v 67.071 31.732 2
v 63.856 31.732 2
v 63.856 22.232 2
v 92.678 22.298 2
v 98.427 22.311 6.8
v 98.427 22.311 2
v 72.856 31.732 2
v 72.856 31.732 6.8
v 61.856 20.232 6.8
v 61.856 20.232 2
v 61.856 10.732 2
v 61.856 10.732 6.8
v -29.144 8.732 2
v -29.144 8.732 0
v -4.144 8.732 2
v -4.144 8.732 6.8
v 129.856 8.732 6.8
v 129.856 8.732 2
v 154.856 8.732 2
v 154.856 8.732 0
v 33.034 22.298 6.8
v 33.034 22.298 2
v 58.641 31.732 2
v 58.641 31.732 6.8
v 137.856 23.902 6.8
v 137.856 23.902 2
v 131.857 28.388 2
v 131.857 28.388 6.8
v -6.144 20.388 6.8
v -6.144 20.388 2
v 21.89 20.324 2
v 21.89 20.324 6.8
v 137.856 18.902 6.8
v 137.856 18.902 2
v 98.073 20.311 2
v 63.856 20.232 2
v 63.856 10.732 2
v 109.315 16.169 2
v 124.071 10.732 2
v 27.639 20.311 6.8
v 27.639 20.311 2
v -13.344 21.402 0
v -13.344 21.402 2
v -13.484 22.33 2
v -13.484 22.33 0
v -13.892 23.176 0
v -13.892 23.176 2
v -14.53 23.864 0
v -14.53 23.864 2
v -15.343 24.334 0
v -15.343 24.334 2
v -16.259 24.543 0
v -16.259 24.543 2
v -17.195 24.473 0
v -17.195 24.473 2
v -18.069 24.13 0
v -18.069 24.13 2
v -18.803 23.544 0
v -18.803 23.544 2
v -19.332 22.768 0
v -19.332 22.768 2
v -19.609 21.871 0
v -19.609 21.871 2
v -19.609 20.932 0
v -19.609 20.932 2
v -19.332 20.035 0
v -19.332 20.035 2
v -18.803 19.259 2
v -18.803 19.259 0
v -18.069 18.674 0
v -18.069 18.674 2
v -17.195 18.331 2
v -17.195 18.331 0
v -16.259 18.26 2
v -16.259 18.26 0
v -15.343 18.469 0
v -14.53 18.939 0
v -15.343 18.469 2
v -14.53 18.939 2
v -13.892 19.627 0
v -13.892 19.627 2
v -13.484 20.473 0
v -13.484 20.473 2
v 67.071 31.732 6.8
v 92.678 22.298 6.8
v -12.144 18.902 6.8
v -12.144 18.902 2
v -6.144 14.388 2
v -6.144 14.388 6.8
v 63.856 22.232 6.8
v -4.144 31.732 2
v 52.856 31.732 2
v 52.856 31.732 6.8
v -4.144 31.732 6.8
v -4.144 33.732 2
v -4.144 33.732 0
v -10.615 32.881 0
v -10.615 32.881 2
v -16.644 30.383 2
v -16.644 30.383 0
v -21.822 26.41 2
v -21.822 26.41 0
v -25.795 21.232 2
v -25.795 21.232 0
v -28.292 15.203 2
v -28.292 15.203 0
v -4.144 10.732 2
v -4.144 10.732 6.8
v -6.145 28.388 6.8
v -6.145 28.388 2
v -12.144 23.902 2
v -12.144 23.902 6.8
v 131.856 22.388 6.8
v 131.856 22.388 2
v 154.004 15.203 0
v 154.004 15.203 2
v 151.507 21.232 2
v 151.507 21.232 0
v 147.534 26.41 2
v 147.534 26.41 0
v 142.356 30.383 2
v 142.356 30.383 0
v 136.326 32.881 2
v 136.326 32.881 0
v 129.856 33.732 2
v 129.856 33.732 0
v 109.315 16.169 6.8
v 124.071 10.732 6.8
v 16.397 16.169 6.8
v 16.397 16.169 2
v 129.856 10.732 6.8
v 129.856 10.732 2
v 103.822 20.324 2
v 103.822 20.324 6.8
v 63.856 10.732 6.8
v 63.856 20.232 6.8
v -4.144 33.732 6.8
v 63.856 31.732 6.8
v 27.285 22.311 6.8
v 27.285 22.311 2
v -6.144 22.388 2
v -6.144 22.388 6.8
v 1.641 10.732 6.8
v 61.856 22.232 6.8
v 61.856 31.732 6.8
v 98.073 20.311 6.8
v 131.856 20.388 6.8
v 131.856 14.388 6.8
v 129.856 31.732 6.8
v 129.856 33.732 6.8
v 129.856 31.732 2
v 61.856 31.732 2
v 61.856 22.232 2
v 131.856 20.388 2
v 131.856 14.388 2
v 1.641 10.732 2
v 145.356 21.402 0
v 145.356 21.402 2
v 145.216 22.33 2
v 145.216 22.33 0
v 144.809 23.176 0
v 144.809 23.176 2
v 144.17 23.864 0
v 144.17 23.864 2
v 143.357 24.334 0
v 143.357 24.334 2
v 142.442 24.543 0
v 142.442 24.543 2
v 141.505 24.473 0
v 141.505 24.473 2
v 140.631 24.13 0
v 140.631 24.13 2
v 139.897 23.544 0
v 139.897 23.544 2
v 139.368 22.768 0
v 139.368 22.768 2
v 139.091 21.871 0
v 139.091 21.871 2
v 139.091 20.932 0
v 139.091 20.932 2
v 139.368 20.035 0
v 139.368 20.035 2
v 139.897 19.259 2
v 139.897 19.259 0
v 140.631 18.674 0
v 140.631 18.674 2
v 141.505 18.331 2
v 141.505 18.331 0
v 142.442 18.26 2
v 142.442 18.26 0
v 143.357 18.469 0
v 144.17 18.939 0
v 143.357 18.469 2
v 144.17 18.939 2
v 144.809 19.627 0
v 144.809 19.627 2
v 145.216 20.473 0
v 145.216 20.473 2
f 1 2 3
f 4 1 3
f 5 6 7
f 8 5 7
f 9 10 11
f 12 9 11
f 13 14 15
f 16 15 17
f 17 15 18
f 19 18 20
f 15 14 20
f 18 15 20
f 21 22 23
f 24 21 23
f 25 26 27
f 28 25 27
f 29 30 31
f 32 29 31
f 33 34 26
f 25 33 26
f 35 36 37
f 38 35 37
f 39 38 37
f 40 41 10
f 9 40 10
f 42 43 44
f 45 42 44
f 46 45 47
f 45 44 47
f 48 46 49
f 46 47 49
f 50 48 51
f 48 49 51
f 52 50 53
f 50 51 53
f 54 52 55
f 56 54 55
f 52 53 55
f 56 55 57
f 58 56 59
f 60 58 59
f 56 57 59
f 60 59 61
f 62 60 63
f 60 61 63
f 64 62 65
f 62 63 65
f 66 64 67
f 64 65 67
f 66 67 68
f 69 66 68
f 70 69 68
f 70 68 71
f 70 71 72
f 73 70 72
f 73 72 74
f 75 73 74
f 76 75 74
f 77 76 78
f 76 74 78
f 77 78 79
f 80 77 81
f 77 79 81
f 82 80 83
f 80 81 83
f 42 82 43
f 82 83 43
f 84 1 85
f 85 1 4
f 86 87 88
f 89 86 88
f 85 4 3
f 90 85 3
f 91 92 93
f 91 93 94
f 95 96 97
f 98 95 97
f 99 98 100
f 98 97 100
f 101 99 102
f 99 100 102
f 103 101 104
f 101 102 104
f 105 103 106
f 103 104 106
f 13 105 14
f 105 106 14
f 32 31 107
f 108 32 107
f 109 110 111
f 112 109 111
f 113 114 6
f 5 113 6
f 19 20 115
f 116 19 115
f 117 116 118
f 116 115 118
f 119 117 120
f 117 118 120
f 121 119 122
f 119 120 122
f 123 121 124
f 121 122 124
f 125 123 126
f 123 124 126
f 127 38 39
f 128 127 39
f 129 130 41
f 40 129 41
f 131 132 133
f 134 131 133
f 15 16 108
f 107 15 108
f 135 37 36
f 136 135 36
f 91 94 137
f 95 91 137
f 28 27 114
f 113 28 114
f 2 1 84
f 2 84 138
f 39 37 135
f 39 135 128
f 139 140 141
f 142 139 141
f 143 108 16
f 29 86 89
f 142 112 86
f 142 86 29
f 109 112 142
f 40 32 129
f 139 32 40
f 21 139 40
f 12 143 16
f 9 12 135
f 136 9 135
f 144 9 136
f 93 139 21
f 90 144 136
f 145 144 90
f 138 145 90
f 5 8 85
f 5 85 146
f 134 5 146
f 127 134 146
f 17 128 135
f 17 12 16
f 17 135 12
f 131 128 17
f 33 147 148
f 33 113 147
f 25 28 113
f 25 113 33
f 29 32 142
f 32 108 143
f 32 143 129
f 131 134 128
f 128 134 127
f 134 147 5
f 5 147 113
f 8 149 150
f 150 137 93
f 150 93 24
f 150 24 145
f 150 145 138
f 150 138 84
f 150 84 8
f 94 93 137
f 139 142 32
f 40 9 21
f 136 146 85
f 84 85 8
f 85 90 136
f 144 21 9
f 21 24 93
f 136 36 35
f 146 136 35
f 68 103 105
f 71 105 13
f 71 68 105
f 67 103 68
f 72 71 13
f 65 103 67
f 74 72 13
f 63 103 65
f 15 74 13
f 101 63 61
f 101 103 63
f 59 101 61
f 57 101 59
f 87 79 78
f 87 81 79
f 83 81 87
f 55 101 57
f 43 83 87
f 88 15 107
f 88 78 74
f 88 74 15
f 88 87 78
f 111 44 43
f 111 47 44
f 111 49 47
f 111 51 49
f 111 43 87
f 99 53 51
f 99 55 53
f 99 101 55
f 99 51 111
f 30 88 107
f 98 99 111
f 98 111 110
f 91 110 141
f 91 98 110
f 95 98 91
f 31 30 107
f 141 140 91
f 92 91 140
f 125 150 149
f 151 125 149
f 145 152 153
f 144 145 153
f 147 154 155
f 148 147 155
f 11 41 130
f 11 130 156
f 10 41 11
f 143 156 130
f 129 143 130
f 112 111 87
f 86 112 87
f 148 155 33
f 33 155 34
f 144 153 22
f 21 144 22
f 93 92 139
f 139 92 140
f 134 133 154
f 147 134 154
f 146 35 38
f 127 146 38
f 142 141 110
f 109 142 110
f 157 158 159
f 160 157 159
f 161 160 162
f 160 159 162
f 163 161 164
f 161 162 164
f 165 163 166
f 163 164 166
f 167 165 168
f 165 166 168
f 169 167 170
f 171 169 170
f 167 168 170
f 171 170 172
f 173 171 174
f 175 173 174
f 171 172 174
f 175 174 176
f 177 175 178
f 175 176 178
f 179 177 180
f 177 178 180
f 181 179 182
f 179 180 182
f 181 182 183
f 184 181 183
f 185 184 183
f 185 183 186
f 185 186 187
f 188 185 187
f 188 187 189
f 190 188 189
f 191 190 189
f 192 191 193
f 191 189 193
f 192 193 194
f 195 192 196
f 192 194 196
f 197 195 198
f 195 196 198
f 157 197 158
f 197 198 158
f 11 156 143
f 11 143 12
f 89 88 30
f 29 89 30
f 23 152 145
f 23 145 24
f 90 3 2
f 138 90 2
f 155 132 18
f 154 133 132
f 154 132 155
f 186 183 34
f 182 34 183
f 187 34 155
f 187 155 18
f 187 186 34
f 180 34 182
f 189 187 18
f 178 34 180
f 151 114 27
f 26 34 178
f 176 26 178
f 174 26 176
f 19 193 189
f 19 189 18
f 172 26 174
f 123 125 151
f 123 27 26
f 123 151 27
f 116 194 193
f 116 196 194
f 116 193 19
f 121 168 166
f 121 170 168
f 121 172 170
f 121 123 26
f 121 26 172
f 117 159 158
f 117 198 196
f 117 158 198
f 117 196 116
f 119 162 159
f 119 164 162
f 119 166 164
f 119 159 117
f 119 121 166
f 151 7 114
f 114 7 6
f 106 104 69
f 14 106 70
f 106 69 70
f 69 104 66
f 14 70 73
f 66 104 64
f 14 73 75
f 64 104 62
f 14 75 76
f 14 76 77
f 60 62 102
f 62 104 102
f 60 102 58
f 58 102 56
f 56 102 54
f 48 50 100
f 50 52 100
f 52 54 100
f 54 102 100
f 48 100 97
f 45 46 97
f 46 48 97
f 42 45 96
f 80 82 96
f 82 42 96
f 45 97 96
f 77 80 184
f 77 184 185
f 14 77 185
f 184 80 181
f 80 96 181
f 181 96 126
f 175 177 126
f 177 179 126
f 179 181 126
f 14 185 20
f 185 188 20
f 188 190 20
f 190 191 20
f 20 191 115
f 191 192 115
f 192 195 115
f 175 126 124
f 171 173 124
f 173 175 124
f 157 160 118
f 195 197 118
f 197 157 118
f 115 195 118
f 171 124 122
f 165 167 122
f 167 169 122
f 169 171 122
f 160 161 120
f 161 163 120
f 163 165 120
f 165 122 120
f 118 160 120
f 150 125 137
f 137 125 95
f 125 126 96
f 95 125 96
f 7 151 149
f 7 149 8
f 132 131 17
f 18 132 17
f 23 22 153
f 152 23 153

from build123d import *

# Parameters (mm, degrees)
F1_DEPTH = 6.8
F2_T     = -2
F4_DEPTH = 4.8
F6_DEPTH = 4.8
F5_R     = 3.15
F7_DEPTH = 2


# Not quite as in the source:
# - a feature names something its author has since deleted; it is built from what else it names


with BuildPart() as f1:
    # F0 (on Top) → F1 (new body)
    with BuildSketch(Plane.XY):
        with BuildLine():
            Line((129.8559711718, 33.7323809788), (-4.1440288282, 33.7323809788))
            ThreePointArc((-4.1440288282, 33.7323809788), (-21.8216983579, 26.4100505084), (-29.1440288282, 8.7323809788))
            Line((-29.1440288282, 8.7323809788), (154.8559711718, 8.7323809788))
            ThreePointArc((154.8559711718, 8.7323809788), (147.5336407015, 26.4100505084), (129.8559711718, 33.7323809788))
        make_face()
    extrude(amount=F1_DEPTH)

    # F2
    f2_openings = [f1.faces().sort_by_distance(p)[0] for p in [
        (62.855971, 20.804106, 6.8),
    ]]
    offset(amount=F2_T, openings=f2_openings)

    # F3 (on face) → F4 (cut)
    with BuildSketch(Plane.XY.offset(6.8)):
        with BuildLine():
            Line((-4.1440288282, 8.7323809788), (-4.1440288282, 10.7323809788))
            Line((-4.1440288282, 10.7323809788), (-27.056907303, 10.7323809788))
            ThreePointArc((-27.056907303, 10.7323809788), (-19.6842990961, 25.6882059366), (-4.1440288282, 31.7323809788))
            Line((-4.1440288282, 31.7323809788), (-4.1440288282, 33.7323809788))
            ThreePointArc((-4.1440288282, 33.7323809788), (-21.8216983579, 26.4100505084), (-29.1440288282, 8.7323809788))
            Line((-29.1440288282, 8.7323809788), (-4.1440288282, 8.7323809788))
        make_face()
        with BuildLine():
            Line((152.7688496466, 10.7323809788), (129.8559711718, 10.7323809788))
            Line((129.8559711718, 10.7323809788), (129.8559711718, 8.7323809788))
            Line((129.8559711718, 8.7323809788), (154.8559711718, 8.7323809788))
            ThreePointArc((154.8559711718, 8.7323809788), (147.5336407015, 26.4100505084), (129.8559711718, 33.7323809788))
            Line((129.8559711718, 33.7323809788), (129.8559711718, 31.7323809788))
            ThreePointArc((129.8559711718, 31.7323809788), (145.3962414397, 25.6882059366), (152.7688496466, 10.7323809788))
        make_face()
    extrude(amount=-F4_DEPTH, mode=Mode.SUBTRACT)

    # F5 (on face) → F6 (join)
    with BuildSketch(Plane.XY.offset(2)):
        Polygon((-6.1442747528, 21.3878121691), (-6.144358997, 22.3878121656), (-6.1448644621, 28.3878121443), (-12.1442590792, 23.9015265012), (-12.1442590792, 21.4015265012), (-12.1442590792, 18.9015265012), (-6.1442747528, 14.3878121691), (-6.1442747528, 20.3878121691), align=None)
        Polygon((21.8896443518, 20.3237342556), (27.2847434124, 22.3114023306), (-6.144358997, 22.3878121656), (-6.1442747528, 21.3878121691), (-6.1442747528, 20.3878121691), align=None)
        Polygon((-4.1440288282, 10.7323809788), (1.6412445236, 10.7323809788), (16.3966900356, 16.1685977463), (27.6392464887, 20.3105922291), (21.8896443518, 20.3237342556), align=None)
        Polygon((32.9729093256, 22.2756259058), (33.0343455494, 22.298260304), (27.2847434124, 22.3114023306), (21.8896443518, 20.3237342556), (27.6392464887, 20.3105922291), align=None)
        Polygon((33.0343455494, 22.298260304), (58.6412445236, 31.7323809788), (54.8559711718, 31.7323809788), (52.8559711718, 31.7323809788), (27.2847434124, 22.3114023306), align=None)
        Polygon((61.8564633663, 20.2323809788), (61.8564633663, 22.2323807827), (33.0343455494, 22.298260304), (32.9729093256, 22.2756259058), (27.6392464887, 20.3105922291), align=None)
        Polygon((62.8559711718, 10.7323809788), (62.8559711718, 31.7323809788), (61.8564633663, 31.7323809788), (61.8564633663, 22.2323807827), (61.8564633663, 20.2323809788), (61.8564633663, 10.7323809788), align=None)
        Polygon((92.6775967943, 22.298260304), (63.8559711718, 22.2323819077), (63.8559711718, 20.2323821038), (98.0726958549, 20.3105922291), (92.7390330181, 22.2756259058), align=None)
        Polygon((72.8559711718, 31.7323809788), (67.07069782, 31.7323809788), (92.6775967943, 22.298260304), (98.4271989312, 22.3114023306), align=None)
        Polygon((98.4271989312, 22.3114023306), (92.6775967943, 22.298260304), (92.7390330181, 22.2756259058), (98.0726958549, 20.3105922291), (103.8222979918, 20.3237342556), align=None)
        Polygon((109.3152523081, 16.1685977463), (124.07069782, 10.7323809788), (129.8559711718, 10.7323809788), (103.8222979918, 20.3237342556), (98.0726958549, 20.3105922291), align=None)
        Polygon((131.8563013406, 22.3878121656), (98.4271989312, 22.3114023306), (103.8222979918, 20.3237342556), (131.8562170965, 20.3878121691), (131.8562170965, 21.3878121691), align=None)
        Polygon((131.8568068057, 28.3878121443), (131.8563013406, 22.3878121656), (131.8562170965, 21.3878121691), (131.8562170965, 20.3878121691), (131.8562170965, 14.3878121691), (137.8562014229, 18.9015265012), (137.8562014229, 21.4015265012), (137.8562014229, 23.9015265012), align=None)
        Polygon((63.8559711718, 31.7323809788), (62.8559711718, 31.7323809788), (62.8559711718, 10.7323809788), (63.8559711718, 10.7323809788), (63.8559711718, 20.2323821038), (63.8559711718, 22.2323819077), align=None)
    extrude(amount=F6_DEPTH)

    # F5 (on face) → F7 (cut)
    with BuildSketch(Plane.XY.offset(2)):
        with Locations((-16.4942590792, 21.4015265012)):
            Circle(F5_R)
        with Locations((142.2062014229, 21.4015265012)):
            Circle(F5_R)
    extrude(amount=-F7_DEPTH, mode=Mode.SUBTRACT)


solid = f1.part
